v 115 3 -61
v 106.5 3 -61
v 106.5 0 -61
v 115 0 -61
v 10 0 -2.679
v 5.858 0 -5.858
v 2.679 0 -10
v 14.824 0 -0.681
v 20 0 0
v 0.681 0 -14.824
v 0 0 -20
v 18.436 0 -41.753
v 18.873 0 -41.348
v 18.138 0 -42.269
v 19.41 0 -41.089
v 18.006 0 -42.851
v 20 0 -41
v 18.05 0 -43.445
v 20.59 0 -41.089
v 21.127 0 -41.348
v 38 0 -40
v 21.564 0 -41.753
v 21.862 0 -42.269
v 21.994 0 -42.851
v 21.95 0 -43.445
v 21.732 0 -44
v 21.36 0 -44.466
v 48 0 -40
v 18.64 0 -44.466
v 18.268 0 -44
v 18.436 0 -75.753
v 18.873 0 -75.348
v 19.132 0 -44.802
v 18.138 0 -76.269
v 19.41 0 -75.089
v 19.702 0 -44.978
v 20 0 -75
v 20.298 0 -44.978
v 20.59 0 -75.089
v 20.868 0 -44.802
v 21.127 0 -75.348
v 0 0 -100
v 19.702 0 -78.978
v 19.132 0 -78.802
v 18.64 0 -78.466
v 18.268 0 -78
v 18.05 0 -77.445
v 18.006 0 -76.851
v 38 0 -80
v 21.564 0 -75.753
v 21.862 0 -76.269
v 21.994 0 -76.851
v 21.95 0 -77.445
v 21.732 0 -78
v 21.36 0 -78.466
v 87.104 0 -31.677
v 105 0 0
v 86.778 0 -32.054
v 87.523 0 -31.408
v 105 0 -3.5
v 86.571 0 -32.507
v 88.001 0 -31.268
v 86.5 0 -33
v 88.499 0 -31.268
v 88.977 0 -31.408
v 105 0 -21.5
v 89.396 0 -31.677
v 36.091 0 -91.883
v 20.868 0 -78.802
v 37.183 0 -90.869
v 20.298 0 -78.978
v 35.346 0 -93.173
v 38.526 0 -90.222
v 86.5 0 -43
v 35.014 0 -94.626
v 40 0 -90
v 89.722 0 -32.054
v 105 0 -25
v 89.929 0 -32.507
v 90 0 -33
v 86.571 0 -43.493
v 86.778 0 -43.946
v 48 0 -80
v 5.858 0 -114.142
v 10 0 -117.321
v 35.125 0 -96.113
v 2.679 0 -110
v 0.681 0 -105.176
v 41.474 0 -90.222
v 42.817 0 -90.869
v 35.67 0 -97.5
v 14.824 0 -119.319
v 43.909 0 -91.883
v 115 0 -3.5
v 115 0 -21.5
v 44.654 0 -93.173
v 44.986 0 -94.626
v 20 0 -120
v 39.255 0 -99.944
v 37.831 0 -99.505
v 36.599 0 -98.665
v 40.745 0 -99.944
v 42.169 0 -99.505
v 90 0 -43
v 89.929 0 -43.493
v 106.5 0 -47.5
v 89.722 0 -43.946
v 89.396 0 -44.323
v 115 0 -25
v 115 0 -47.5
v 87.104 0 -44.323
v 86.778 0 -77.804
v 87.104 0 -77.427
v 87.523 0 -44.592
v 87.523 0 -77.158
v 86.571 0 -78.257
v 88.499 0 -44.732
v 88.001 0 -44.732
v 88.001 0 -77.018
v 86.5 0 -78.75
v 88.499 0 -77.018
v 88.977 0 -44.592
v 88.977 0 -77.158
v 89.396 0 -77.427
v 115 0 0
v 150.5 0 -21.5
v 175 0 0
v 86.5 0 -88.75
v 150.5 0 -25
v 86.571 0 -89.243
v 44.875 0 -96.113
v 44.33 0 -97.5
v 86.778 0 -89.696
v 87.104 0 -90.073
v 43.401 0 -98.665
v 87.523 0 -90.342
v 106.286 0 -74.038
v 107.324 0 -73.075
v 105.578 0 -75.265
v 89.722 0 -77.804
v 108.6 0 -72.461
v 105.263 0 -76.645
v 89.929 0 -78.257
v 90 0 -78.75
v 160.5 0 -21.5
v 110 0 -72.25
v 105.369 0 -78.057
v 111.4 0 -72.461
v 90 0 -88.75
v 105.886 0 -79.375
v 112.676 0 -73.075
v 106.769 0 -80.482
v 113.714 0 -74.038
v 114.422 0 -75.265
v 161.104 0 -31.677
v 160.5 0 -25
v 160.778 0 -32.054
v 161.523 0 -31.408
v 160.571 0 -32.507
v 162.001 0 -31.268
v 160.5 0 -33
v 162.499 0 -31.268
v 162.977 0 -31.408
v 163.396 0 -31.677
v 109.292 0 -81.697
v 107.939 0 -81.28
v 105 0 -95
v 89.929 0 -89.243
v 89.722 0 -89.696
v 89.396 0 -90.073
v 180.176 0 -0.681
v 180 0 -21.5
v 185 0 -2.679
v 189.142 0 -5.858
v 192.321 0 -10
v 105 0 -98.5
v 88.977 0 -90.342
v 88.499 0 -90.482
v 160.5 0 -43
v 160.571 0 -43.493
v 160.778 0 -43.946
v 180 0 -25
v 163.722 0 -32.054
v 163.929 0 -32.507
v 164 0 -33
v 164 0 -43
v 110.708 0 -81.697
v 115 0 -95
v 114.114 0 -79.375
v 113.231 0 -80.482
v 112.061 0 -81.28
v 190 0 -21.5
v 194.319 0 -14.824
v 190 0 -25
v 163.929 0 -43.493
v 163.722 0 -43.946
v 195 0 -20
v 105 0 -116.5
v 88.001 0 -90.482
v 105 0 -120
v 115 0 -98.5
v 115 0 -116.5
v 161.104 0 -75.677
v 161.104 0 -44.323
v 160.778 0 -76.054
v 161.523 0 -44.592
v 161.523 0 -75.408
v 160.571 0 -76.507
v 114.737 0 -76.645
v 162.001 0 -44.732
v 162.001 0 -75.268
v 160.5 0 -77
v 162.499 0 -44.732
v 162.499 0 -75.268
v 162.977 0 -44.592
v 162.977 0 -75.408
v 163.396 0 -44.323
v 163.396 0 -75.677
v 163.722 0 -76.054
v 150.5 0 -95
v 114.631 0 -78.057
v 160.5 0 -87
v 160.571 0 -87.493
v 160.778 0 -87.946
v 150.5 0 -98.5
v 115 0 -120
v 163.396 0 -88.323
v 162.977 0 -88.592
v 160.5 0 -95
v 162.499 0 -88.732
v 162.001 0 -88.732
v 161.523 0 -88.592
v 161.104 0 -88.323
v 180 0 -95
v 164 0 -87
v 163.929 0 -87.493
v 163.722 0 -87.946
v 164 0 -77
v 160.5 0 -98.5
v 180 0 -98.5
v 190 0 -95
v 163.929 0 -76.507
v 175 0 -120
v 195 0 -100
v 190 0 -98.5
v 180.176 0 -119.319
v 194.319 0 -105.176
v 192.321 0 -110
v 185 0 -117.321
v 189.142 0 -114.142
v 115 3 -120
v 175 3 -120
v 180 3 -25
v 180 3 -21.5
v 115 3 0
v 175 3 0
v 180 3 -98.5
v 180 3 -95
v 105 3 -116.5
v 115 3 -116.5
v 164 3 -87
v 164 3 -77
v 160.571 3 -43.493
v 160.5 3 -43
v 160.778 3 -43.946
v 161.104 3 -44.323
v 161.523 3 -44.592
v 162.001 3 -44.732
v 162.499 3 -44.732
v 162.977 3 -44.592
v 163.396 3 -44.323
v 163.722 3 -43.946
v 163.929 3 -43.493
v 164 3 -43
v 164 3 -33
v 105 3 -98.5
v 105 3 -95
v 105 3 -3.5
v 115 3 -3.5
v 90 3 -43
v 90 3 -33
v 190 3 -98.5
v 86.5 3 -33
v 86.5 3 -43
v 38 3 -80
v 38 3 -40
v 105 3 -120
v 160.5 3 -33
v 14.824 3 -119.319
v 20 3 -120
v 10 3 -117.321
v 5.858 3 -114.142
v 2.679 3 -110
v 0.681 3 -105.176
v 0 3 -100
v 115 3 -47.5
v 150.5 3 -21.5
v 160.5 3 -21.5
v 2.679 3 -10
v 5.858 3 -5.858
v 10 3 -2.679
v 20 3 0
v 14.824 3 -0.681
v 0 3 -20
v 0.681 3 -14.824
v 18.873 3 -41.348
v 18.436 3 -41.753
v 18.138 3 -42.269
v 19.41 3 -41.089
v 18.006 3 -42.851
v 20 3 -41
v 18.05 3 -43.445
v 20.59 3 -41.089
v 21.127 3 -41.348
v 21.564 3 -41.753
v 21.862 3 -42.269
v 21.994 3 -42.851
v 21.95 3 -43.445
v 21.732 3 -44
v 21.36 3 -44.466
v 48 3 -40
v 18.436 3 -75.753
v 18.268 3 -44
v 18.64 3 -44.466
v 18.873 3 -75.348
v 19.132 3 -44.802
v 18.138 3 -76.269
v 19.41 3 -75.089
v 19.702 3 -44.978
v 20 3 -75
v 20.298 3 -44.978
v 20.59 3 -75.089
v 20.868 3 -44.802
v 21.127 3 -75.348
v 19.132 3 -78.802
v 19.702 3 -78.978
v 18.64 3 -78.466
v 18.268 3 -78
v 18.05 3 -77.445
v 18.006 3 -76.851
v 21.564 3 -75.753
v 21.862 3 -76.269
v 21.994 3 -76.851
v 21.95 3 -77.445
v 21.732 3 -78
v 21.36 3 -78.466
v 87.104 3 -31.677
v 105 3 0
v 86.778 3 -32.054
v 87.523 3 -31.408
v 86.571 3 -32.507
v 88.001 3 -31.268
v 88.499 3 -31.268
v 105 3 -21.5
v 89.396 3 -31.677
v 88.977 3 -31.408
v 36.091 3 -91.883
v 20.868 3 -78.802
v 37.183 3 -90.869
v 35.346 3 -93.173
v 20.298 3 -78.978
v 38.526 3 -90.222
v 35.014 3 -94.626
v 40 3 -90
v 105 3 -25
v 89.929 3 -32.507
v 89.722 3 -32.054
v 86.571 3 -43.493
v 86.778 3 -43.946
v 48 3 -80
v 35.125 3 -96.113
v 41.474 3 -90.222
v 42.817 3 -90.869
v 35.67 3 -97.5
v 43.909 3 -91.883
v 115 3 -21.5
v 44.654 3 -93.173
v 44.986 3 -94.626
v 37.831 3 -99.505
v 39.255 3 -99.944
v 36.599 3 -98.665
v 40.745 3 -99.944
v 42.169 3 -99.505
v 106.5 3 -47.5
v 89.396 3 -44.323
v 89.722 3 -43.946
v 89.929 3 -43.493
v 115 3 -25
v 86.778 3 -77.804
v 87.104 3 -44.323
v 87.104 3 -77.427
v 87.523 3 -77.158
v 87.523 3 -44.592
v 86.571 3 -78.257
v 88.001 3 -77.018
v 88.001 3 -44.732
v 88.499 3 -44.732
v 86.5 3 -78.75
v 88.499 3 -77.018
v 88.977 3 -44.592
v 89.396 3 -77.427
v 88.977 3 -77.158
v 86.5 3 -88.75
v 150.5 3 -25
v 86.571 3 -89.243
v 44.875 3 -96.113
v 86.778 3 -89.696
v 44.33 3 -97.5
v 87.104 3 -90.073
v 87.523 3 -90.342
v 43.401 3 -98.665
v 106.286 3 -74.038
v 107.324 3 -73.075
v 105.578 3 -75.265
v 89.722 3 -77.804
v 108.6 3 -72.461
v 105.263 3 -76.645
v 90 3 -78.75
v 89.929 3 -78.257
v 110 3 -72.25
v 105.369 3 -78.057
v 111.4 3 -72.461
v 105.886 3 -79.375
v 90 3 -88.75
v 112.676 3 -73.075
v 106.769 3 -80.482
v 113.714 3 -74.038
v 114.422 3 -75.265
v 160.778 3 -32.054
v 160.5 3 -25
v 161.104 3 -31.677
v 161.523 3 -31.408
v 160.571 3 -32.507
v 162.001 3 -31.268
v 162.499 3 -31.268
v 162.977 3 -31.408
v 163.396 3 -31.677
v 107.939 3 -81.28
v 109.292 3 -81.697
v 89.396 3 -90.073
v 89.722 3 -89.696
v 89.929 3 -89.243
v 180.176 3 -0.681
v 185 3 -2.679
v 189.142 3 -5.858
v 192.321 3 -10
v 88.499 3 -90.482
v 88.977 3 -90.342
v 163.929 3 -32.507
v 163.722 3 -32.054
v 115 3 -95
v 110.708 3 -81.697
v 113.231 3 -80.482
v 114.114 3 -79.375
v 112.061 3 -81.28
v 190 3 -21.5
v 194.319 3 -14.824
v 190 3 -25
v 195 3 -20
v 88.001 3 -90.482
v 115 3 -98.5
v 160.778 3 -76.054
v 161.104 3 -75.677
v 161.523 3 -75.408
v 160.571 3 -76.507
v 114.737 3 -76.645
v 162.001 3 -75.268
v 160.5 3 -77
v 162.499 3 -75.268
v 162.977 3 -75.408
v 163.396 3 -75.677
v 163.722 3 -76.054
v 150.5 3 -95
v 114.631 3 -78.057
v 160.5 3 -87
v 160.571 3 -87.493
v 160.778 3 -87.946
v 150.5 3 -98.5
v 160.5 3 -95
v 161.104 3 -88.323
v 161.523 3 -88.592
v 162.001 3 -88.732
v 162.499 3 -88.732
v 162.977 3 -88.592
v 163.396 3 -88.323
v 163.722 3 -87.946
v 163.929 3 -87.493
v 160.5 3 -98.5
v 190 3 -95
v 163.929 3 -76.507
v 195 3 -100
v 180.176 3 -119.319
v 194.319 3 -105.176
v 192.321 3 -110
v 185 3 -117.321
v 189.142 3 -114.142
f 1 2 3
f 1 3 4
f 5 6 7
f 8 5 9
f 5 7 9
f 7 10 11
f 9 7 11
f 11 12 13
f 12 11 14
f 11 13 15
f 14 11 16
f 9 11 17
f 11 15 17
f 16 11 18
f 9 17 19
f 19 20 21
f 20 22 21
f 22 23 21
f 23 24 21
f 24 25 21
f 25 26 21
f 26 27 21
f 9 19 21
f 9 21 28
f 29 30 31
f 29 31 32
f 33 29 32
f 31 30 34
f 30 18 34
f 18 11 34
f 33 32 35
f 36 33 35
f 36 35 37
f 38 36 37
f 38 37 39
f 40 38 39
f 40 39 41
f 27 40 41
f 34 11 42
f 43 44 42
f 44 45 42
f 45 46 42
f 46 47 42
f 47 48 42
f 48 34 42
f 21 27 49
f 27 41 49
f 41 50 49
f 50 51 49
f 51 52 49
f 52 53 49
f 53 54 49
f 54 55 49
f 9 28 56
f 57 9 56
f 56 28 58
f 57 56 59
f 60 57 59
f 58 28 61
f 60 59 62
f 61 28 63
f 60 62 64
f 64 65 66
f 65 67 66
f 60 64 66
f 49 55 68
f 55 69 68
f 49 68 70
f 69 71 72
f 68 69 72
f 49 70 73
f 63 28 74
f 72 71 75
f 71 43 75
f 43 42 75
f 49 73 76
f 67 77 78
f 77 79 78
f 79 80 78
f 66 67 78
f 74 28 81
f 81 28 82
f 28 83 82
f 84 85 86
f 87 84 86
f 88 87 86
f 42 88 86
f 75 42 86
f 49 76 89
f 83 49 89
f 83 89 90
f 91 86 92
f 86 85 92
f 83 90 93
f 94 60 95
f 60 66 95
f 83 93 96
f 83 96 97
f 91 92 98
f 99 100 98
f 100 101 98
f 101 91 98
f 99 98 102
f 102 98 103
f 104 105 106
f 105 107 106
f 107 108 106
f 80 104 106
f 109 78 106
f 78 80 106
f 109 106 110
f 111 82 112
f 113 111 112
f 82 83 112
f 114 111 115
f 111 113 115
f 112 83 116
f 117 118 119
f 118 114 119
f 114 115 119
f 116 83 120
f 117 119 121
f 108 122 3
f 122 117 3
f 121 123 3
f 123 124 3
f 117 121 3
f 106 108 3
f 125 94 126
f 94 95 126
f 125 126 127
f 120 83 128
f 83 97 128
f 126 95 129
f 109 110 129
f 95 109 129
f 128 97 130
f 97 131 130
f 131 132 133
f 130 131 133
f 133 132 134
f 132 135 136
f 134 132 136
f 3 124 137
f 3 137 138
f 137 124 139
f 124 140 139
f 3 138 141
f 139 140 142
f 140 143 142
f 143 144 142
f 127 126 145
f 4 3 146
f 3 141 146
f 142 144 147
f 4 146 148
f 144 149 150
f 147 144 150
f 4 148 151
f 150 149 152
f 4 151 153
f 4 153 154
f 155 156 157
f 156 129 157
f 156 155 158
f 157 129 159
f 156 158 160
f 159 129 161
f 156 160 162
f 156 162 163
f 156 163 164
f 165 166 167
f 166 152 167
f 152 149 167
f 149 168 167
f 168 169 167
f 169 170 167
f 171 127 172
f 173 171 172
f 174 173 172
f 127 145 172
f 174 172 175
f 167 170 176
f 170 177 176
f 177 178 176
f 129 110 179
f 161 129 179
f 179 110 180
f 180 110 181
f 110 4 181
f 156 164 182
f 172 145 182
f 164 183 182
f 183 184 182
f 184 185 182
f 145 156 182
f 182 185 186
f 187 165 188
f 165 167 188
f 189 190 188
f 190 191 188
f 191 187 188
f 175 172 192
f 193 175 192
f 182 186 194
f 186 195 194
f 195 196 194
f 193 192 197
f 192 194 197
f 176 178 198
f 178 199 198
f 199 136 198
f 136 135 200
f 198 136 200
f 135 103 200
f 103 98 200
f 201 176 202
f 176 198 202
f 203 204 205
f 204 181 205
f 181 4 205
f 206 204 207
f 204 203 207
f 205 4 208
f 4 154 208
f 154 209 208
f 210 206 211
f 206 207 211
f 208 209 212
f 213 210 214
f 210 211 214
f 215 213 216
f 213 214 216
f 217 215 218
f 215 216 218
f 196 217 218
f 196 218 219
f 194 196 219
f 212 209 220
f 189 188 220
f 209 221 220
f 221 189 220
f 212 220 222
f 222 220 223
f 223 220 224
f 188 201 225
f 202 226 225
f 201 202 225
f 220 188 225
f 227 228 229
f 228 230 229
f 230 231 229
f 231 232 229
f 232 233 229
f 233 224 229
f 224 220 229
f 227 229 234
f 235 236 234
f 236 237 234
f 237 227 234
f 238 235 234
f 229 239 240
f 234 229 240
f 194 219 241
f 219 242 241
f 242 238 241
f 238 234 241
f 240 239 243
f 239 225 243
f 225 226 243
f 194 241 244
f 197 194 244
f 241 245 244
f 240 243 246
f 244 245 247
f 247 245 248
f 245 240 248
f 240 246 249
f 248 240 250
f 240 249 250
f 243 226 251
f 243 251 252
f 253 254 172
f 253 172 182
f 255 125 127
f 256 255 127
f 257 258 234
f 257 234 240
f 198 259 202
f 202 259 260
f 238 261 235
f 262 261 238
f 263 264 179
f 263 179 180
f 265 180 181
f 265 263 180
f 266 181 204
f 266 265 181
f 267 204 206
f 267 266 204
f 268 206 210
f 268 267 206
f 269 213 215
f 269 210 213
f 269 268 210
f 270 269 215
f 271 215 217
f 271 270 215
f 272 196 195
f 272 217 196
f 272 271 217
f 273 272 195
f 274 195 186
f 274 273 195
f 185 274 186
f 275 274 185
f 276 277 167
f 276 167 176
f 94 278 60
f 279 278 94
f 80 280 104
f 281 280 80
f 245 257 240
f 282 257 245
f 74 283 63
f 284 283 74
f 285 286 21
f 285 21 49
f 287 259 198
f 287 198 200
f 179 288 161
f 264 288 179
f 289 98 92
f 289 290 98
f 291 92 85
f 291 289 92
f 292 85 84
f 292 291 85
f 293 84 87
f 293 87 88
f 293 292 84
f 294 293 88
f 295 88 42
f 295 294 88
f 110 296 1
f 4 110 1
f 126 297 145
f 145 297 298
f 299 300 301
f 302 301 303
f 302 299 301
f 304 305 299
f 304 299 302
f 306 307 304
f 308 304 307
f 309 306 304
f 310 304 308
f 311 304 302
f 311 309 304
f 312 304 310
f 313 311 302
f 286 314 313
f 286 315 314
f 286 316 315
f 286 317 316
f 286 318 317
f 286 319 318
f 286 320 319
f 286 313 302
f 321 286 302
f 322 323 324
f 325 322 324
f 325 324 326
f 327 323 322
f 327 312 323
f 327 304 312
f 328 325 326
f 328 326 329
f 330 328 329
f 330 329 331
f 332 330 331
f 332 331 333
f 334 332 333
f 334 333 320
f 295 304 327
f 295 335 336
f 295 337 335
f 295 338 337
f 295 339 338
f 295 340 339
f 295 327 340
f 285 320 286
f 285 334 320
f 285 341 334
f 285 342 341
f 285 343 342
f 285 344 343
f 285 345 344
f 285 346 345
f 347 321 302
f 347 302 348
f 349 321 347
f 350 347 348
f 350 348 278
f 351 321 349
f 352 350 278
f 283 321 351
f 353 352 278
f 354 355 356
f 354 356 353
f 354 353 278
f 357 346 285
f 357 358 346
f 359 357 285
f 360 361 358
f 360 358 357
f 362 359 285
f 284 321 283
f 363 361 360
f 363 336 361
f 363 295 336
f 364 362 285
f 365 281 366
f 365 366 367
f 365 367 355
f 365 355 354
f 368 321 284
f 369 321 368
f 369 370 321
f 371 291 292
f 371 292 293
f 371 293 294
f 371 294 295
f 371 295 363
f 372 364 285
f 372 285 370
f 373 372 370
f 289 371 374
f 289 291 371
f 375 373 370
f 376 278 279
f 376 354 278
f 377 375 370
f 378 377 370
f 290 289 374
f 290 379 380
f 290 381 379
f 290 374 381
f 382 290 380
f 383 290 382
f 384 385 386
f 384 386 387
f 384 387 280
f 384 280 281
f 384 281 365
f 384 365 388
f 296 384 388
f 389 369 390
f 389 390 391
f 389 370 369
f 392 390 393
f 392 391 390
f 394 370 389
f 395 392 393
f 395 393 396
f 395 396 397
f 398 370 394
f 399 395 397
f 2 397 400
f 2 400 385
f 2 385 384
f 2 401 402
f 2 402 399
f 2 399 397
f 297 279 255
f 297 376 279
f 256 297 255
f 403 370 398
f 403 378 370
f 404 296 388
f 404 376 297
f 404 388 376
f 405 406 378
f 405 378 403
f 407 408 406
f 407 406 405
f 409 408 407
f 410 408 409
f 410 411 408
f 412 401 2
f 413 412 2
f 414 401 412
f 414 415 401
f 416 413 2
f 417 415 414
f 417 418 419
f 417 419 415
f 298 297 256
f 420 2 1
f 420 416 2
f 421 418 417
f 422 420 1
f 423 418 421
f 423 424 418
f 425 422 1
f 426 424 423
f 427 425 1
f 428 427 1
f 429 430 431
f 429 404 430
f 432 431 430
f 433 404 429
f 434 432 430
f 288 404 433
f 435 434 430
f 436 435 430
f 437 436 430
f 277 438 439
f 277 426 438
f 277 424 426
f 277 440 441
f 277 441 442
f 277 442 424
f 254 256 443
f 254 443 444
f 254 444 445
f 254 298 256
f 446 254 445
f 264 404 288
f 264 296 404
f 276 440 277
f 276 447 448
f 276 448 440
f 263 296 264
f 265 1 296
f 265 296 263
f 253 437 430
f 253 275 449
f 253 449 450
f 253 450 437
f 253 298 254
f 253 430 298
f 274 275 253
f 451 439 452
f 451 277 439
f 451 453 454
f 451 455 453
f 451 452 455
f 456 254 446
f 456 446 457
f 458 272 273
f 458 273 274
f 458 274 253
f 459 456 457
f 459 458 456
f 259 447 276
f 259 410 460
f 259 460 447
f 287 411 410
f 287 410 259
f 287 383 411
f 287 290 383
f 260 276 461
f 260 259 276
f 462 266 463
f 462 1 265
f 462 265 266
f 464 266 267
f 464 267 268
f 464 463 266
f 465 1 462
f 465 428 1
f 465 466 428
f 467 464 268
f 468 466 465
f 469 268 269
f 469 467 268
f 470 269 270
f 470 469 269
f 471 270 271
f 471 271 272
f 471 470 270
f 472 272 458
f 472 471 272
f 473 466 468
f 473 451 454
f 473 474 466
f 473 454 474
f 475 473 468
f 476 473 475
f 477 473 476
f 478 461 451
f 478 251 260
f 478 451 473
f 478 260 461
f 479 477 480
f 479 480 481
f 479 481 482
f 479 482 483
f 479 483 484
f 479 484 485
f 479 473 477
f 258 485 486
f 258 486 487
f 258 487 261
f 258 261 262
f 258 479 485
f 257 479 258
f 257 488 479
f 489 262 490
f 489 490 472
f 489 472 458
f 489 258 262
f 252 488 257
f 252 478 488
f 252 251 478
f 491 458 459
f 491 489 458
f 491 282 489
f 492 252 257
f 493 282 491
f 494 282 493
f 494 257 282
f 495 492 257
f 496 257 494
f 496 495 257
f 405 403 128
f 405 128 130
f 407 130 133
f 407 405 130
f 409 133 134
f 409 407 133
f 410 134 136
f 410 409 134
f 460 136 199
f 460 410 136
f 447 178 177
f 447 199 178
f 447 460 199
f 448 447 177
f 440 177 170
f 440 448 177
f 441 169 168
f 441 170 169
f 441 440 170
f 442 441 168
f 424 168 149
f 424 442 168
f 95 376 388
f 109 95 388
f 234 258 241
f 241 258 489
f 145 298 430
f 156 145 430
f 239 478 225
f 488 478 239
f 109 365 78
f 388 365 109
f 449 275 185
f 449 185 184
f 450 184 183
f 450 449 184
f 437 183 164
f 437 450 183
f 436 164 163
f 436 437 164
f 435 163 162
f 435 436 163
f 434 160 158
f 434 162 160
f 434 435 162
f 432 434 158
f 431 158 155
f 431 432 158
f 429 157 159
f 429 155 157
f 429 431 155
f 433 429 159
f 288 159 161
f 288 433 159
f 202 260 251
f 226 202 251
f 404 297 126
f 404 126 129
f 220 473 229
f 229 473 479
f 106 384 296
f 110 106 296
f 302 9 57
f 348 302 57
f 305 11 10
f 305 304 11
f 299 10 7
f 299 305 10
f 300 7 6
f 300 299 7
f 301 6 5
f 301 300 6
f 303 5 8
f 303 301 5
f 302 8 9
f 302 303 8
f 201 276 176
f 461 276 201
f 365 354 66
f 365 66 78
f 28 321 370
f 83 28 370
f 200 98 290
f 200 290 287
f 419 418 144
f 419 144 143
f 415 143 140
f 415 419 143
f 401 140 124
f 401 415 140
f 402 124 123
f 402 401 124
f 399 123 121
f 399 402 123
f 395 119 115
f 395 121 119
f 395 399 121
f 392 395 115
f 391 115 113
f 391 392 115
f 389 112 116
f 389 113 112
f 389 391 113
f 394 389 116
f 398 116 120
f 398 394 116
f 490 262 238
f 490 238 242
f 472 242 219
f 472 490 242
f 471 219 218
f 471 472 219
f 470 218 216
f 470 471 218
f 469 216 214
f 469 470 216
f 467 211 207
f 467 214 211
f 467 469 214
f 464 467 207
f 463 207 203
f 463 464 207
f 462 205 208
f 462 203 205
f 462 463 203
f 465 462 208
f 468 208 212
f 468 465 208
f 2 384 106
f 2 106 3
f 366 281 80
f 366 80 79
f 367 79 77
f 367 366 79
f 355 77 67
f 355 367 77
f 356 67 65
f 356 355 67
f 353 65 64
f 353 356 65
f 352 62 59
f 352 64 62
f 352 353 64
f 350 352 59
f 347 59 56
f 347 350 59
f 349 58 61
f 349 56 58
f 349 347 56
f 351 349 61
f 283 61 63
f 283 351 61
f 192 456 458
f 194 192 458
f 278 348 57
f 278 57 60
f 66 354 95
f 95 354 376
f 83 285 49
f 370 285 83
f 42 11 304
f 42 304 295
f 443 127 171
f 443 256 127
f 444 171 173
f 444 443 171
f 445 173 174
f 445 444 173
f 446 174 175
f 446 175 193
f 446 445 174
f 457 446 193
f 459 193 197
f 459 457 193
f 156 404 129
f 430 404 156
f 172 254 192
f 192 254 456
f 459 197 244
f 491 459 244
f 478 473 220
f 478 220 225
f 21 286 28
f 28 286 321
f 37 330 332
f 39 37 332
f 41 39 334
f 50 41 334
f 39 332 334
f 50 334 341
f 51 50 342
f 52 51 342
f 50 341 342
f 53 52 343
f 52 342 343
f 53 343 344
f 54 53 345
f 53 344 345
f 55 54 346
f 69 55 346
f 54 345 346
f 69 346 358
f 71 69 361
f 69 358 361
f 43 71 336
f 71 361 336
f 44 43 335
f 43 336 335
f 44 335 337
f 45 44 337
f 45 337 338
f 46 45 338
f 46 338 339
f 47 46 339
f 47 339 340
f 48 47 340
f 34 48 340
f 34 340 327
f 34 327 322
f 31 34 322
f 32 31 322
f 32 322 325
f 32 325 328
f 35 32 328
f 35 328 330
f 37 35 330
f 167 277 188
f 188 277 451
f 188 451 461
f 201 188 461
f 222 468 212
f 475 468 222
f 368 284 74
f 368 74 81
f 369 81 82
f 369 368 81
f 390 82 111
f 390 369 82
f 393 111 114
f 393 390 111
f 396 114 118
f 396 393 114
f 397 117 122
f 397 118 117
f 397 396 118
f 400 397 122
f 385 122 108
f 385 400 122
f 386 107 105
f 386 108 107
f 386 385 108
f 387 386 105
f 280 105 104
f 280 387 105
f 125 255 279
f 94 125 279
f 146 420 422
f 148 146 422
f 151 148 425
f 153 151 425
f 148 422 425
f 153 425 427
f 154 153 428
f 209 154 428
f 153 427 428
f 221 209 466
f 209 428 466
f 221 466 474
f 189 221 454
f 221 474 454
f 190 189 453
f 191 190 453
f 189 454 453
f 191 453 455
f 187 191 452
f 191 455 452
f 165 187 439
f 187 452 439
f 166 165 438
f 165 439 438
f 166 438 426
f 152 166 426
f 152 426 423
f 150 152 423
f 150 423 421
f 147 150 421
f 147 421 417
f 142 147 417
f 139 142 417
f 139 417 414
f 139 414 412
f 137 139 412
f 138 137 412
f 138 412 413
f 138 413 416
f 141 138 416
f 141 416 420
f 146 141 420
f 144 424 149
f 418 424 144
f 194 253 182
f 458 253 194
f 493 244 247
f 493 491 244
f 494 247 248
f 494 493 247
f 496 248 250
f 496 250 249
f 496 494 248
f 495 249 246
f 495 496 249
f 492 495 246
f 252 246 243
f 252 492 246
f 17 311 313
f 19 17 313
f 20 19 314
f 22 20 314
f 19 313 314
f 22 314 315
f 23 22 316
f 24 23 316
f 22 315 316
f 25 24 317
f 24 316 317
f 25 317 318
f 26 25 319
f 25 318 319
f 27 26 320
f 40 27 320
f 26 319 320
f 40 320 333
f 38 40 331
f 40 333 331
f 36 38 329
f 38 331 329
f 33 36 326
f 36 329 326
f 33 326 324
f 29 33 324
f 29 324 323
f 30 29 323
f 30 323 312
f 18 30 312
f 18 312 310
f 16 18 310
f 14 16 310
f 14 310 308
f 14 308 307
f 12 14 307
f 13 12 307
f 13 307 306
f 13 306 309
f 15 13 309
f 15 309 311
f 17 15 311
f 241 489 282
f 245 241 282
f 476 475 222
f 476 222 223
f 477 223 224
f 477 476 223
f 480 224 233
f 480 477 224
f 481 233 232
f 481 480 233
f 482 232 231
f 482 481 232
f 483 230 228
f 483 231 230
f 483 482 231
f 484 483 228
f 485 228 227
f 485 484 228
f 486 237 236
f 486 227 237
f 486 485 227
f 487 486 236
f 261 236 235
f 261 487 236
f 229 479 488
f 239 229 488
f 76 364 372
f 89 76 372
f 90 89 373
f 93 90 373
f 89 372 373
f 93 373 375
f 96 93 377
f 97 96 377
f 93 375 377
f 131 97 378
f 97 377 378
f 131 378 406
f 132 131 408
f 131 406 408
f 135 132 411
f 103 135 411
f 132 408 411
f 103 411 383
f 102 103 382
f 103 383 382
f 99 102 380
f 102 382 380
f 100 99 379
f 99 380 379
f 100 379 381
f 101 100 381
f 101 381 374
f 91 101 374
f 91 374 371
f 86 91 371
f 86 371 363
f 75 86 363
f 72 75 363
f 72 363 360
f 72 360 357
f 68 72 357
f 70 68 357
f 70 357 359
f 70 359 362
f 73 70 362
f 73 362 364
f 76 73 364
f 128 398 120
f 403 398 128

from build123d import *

# Parameters (mm, degrees)
ESBO_O1_W                = 195
ESBO_O1_H                = 120
RESSALTO_EXTRUS_O1_DEPTH = 3
FILETE1_R                = 20
FILETE2_R                = 20
FILETE3_R                = 20
FILETE4_R                = 20
ESBO_O2_W                = 10
ESBO_O2_H                = 3.5
CORTE_EXTRUS_O1_DEPTH    = 229.984715647
CORTE_EXTRUS_O2_DEPTH    = 229.984715647
ESBO_O4_R                = 4.75
ESBO_O4_W                = 8.5
ESBO_O4_H                = 13.5
CORTE_EXTRUS_O3_DEPTH    = 229.984715647
ESBO_O5_R                = 5
ESBO_O5_R_2              = 2
ESBO_O5_W                = 10
ESBO_O5_H                = 40
CORTE_EXTRUS_O4_DEPTH    = 229.984715647


with BuildPart() as part:
    # Esboço1 → Ressalto-extrusão1 (new body)
    with BuildSketch(Plane(origin=(0, 0, 0), x_dir=(1, 0, 0), z_dir=(0, 1, 0))):
        with Locations((97.5, 60)):
            Rectangle(ESBO_O1_W, ESBO_O1_H)
    extrude(amount=RESSALTO_EXTRUS_O1_DEPTH)

    # Filete1
    filete1_edges = [part.edges().sort_by_distance(p)[0] for p in [
        (0, 1.5, 0),
    ]]
    fillet(filete1_edges, radius=FILETE1_R)

    # Filete2
    filete2_edges = [part.edges().sort_by_distance(p)[0] for p in [
        (195, 1.5, 0),
    ]]
    fillet(filete2_edges, radius=FILETE2_R)

    # Filete3
    filete3_edges = [part.edges().sort_by_distance(p)[0] for p in [
        (195, 1.5, -120),
    ]]
    fillet(filete3_edges, radius=FILETE3_R)

    # Filete4
    filete4_edges = [part.edges().sort_by_distance(p)[0] for p in [
        (0, 1.5, -120),
    ]]
    fillet(filete4_edges, radius=FILETE4_R)

    # Esboço2 → Corte-extrusão1 (cut, through all)
    with BuildSketch(Plane(origin=(0, 3, 0), x_dir=(1, 0, 0), z_dir=(0, 1, 0))):
        with Locations((110, 1.75)):
            Rectangle(ESBO_O2_W, ESBO_O2_H)
        with Locations((110, 118.25)):
            Rectangle(ESBO_O2_W, ESBO_O2_H)
        with Locations((110, 23.25)):
            Rectangle(ESBO_O2_W, ESBO_O2_H)
        with Locations((110, 96.75)):
            Rectangle(ESBO_O2_W, ESBO_O2_H)
        with Locations((155.5, 23.25)):
            Rectangle(ESBO_O2_W, ESBO_O2_H)
        with Locations((185, 23.25)):
            Rectangle(ESBO_O2_W, ESBO_O2_H)
        with Locations((155.5, 96.75)):
            Rectangle(ESBO_O2_W, ESBO_O2_H)
        with Locations((185, 96.75)):
            Rectangle(ESBO_O2_W, ESBO_O2_H)
    extrude(amount=-CORTE_EXTRUS_O1_DEPTH, mode=Mode.SUBTRACT)

    # Esboço3 → Corte-extrusão2 (cut, through all)
    with BuildSketch(Plane(origin=(0, 3, 0), x_dir=(1, 0, 0), z_dir=(0, 1, 0))):
        with BuildLine():
            Line((164, 87), (164, 77))
            ThreePointArc((164, 77), (162.25, 75.25), (160.5, 77))
            Line((160.5, 77), (160.5, 87))
            ThreePointArc((160.5, 87), (162.25, 88.75), (164, 87))
        make_face()
        with BuildLine():
            Line((164, 43), (164, 33))
            ThreePointArc((164, 33), (162.25, 31.25), (160.5, 33))
            Line((160.5, 33), (160.5, 43))
            ThreePointArc((160.5, 43), (162.25, 44.75), (164, 43))
        make_face()
        with BuildLine():
            Line((90, 43), (90, 33))
            ThreePointArc((90, 33), (88.25, 31.25), (86.5, 33))
            Line((86.5, 33), (86.5, 43))
            ThreePointArc((86.5, 43), (88.25, 44.75), (90, 43))
        make_face()
        with BuildLine():
            Line((90, 88.75), (90, 78.75))
            ThreePointArc((90, 78.75), (88.25, 77), (86.5, 78.75))
            Line((86.5, 78.75), (86.5, 88.75))
            ThreePointArc((86.5, 88.75), (88.25, 90.5), (90, 88.75))
        make_face()
    extrude(amount=-CORTE_EXTRUS_O2_DEPTH, mode=Mode.SUBTRACT)

    # Esboço4 → Corte-extrusão3 (cut, through all)
    with BuildSketch(Plane(origin=(0, 3, 0), x_dir=(1, 0, 0), z_dir=(0, 1, 0))):
        with Locations(Location((110, 77, 0), (0, 0, 270))):
            Circle(ESBO_O4_R)
        with Locations((110.75, 54.25)):
            Rectangle(ESBO_O4_W, ESBO_O4_H)
    extrude(amount=-CORTE_EXTRUS_O3_DEPTH, mode=Mode.SUBTRACT)

    # Esboço5 → Corte-extrusão4 (cut, through all)
    with BuildSketch(Plane(origin=(0, 3, 0), x_dir=(1, 0, 0), z_dir=(0, 1, 0))):
        with Locations(Location((40, 95, 0), (0, 0, 270))):
            Circle(ESBO_O5_R)
        with Locations(Location((20, 77, 0), (0, 0, 270))):
            Circle(ESBO_O5_R_2)
        with Locations(Location((20, 43, 0), (0, 0, 270))):
            Circle(ESBO_O5_R_2)
        with Locations((43, 60)):
            Rectangle(ESBO_O5_W, ESBO_O5_H)
    extrude(amount=-CORTE_EXTRUS_O4_DEPTH, mode=Mode.SUBTRACT)


solid = part.part
